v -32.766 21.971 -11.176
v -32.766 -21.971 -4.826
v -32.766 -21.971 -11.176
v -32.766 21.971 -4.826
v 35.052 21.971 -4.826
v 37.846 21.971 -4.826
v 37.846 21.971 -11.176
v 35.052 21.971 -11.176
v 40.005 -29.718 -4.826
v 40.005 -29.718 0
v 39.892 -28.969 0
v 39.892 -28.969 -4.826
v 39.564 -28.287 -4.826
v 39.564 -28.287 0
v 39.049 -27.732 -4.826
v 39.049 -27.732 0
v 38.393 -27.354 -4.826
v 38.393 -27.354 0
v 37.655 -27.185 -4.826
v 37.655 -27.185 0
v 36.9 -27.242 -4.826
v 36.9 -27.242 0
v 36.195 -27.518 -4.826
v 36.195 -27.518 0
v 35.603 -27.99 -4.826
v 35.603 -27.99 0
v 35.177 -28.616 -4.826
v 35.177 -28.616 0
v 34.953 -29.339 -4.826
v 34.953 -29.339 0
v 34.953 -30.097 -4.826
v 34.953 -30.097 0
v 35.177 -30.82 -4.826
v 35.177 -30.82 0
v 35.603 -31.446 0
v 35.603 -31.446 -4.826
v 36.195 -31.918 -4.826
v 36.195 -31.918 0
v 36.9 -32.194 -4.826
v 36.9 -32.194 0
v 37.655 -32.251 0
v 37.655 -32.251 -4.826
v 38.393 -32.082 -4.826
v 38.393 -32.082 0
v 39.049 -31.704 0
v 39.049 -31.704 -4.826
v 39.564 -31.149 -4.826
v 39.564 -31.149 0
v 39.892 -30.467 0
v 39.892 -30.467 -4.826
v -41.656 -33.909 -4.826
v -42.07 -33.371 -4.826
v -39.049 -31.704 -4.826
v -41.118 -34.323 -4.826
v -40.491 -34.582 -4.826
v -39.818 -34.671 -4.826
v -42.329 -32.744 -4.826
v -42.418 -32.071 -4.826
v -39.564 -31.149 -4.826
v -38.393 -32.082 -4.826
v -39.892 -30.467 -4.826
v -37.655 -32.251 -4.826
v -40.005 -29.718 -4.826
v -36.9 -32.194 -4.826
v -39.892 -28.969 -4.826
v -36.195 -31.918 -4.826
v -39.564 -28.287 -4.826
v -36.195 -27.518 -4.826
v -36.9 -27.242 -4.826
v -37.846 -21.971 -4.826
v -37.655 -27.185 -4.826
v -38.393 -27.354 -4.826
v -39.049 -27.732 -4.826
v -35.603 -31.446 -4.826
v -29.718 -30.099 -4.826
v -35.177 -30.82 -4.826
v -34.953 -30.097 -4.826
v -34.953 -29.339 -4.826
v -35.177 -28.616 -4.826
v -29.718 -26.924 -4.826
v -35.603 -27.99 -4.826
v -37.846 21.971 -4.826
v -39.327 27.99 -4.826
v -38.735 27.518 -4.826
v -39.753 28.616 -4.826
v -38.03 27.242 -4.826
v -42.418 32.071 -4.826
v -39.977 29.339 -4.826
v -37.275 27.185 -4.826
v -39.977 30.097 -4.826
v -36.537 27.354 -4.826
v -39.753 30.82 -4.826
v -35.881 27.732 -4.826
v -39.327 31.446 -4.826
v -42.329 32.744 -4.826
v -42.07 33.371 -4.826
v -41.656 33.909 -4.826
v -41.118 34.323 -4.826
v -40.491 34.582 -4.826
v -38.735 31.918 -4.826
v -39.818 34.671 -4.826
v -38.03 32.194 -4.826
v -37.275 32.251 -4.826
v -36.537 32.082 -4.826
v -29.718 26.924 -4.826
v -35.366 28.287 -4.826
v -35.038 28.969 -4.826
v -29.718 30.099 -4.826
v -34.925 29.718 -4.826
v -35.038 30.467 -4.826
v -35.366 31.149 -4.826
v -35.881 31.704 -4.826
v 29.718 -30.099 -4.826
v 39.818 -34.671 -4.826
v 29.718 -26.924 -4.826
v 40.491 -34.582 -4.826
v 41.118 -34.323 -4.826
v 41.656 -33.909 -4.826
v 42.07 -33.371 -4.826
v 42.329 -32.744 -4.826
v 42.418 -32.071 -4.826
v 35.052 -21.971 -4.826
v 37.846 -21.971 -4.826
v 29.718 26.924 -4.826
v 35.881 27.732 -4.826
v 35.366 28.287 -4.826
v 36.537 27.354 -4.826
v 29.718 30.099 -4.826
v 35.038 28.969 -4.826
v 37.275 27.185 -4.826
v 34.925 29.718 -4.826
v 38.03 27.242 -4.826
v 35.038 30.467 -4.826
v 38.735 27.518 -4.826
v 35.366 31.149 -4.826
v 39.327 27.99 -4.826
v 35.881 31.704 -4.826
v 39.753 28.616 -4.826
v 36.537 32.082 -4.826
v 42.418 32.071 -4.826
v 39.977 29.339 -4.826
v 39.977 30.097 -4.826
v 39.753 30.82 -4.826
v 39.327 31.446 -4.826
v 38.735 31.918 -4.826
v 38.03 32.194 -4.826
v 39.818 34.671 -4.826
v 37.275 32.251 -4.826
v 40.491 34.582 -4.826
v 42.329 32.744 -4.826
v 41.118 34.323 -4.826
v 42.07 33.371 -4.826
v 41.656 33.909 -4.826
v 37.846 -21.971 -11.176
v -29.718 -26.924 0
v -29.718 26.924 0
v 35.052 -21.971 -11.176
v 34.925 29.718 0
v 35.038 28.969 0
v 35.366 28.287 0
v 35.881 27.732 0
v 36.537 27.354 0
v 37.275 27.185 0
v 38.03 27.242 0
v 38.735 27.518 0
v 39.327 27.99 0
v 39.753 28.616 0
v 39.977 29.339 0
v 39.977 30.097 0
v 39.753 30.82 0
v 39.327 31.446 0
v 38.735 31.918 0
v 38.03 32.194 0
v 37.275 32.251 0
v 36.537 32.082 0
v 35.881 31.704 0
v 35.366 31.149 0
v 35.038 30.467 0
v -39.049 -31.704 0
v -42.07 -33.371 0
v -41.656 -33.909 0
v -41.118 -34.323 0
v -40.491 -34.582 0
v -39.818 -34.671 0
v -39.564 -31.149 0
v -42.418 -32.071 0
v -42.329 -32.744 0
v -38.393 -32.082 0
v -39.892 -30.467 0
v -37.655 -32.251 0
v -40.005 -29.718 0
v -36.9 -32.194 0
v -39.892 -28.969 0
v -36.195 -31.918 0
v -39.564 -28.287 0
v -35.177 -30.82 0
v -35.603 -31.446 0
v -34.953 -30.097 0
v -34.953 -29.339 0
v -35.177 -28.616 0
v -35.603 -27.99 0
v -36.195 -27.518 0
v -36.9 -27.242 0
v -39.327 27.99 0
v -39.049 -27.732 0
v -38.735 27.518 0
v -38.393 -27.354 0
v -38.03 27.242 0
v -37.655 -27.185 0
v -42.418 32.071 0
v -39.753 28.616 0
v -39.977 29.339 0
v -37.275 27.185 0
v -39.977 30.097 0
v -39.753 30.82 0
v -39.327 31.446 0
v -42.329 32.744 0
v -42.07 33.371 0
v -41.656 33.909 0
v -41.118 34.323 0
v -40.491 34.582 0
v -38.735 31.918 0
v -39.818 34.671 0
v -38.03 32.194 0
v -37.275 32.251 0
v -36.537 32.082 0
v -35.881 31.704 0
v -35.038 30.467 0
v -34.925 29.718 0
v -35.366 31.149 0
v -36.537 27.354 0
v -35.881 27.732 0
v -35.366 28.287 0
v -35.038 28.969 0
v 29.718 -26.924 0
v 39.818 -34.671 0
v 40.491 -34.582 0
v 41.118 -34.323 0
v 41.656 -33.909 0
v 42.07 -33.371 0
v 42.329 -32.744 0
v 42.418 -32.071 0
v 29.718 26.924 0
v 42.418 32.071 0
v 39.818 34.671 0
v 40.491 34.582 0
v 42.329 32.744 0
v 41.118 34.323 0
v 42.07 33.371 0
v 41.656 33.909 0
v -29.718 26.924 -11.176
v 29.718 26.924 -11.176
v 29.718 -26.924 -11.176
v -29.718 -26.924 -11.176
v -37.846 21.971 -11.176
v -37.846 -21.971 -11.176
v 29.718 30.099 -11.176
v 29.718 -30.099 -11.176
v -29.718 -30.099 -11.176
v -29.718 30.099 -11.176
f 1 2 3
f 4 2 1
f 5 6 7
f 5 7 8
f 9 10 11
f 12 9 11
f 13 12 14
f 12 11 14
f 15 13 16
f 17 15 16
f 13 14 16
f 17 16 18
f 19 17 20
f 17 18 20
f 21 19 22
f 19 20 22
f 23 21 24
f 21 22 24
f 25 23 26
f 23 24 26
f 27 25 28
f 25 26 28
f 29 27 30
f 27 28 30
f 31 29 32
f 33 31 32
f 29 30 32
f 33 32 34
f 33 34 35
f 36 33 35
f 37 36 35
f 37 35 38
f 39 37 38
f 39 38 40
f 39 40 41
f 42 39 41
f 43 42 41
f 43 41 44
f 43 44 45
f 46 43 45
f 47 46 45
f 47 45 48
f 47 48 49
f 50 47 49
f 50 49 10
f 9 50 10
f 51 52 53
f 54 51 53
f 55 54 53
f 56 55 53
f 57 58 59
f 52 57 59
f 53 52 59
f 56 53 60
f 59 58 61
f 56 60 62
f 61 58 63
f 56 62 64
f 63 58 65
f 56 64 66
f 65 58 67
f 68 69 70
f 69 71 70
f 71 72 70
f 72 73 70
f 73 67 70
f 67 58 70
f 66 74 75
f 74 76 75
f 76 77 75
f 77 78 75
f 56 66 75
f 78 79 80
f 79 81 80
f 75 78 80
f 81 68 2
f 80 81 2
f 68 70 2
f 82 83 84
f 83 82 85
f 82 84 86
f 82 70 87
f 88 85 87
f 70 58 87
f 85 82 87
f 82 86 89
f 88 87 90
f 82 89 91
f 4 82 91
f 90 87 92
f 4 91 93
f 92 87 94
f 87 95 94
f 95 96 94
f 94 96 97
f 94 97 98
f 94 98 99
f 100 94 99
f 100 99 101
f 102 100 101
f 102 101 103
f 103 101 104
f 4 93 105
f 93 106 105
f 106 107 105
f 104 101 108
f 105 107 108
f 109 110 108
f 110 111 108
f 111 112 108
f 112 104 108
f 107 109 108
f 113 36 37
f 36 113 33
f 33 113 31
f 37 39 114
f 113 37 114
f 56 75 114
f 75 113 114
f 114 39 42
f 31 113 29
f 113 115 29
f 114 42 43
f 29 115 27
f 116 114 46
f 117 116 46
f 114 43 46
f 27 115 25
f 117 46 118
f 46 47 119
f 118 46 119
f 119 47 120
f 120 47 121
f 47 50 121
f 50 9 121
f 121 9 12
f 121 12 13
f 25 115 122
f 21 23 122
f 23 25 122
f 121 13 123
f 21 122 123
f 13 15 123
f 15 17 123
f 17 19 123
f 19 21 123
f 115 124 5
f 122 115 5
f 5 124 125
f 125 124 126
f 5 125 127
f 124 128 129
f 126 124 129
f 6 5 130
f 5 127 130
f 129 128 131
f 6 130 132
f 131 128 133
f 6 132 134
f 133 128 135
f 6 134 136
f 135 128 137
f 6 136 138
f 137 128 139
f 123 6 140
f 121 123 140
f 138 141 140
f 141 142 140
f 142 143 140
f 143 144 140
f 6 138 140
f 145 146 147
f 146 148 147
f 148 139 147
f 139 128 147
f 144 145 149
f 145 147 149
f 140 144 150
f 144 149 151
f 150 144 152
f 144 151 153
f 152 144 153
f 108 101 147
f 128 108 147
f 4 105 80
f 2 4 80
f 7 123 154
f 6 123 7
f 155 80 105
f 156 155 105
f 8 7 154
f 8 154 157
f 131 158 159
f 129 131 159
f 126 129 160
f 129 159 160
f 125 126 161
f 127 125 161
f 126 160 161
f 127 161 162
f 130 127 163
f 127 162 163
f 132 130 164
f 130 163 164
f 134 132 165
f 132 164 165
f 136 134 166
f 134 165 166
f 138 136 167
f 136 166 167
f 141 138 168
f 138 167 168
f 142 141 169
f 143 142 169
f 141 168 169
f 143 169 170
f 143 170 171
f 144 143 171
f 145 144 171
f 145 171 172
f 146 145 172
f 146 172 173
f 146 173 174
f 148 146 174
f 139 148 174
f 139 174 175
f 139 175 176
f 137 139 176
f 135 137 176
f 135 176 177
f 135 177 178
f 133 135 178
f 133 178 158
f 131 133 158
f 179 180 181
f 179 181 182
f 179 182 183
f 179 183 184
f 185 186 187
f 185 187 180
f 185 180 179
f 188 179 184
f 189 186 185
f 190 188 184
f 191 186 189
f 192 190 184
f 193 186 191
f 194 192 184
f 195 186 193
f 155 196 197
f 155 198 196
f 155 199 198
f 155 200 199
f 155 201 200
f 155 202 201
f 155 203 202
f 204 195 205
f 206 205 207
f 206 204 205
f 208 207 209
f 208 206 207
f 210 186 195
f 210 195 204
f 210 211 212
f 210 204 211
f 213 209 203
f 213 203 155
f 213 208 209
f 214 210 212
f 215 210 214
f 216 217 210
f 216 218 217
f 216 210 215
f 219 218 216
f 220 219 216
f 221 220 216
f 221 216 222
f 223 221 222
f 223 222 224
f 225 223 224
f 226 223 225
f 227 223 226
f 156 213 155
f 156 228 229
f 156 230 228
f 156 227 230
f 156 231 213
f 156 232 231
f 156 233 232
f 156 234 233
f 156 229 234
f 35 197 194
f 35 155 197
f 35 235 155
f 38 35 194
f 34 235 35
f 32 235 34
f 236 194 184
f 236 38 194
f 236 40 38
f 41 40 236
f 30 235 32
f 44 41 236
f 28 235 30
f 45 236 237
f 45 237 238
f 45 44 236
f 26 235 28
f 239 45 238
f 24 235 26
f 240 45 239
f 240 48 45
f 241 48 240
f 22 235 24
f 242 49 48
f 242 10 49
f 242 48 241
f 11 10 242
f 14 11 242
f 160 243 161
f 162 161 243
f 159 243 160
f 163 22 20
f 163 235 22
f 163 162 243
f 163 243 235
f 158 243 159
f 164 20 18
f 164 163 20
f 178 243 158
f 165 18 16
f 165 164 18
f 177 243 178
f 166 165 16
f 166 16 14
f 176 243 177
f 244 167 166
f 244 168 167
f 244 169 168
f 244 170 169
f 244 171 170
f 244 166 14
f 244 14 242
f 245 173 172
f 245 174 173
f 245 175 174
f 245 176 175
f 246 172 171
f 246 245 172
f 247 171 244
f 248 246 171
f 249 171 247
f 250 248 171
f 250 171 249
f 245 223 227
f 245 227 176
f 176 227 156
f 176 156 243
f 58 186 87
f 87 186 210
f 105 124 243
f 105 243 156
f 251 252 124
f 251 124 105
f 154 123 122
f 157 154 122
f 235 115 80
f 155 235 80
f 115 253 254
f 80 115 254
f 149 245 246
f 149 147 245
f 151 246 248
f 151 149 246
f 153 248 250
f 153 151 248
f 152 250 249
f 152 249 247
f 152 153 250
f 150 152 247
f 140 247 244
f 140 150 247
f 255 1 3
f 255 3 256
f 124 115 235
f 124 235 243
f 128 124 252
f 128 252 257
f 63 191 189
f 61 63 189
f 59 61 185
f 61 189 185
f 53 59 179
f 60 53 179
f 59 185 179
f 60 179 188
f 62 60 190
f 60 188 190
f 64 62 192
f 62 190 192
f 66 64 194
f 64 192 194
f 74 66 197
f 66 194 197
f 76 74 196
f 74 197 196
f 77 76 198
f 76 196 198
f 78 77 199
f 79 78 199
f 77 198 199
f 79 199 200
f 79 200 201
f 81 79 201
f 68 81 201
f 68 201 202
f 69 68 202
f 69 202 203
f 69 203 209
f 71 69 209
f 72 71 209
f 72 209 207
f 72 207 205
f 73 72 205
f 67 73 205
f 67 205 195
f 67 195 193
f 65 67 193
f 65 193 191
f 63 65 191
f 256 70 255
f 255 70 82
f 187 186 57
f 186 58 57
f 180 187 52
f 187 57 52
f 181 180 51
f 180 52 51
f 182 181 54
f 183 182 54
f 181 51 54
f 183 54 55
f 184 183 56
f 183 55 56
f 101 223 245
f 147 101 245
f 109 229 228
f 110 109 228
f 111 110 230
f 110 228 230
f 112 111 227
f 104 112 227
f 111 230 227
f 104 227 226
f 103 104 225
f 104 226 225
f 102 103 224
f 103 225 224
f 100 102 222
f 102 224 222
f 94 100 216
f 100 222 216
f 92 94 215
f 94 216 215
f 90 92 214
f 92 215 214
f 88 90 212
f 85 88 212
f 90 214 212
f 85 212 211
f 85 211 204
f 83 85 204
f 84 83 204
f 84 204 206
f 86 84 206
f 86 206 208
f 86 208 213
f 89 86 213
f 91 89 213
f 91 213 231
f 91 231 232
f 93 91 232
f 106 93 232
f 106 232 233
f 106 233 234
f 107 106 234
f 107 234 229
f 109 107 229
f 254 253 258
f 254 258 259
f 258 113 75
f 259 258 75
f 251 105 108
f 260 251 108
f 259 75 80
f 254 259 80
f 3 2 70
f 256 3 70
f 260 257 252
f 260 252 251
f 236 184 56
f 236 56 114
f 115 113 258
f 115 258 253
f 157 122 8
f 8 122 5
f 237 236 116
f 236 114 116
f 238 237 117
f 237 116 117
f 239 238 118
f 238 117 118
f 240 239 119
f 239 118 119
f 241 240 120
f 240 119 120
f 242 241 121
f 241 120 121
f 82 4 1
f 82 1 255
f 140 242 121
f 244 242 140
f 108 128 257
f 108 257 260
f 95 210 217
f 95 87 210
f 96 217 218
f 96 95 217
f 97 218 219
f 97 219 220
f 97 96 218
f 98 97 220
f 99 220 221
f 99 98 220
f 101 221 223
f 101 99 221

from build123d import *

# Parameters (mm, degrees)
SKETCH1_W           = 84.836
SKETCH1_H           = 69.342
BASE_FLANGE1_DEPTH  = 4.826
SKETCH6_R           = 2.54
CUT_EXTRUDE1_DEPTH  = 10
FILLET1_R           = 2.6
SKETCH11_W          = 59.436
SKETCH11_H          = 3.175
SKETCH11_W_2        = 5.08
SKETCH11_H_2        = 43.942
SKETCH11_W_3        = 2.794
BOSS_EXTRUDE1_DEPTH = 6.35
SKETCH12_W          = 59.436
SKETCH12_H          = 53.848
CUT_EXTRUDE5_DEPTH  = 56.151495583


# Sheet-metal steps are written as plain solids
with BuildPart() as part:
    # Sketch1 → Base-Flange1 (new body)
    with BuildSketch(Plane.XY):
        Rectangle(SKETCH1_W, SKETCH1_H)
    extrude(amount=-BASE_FLANGE1_DEPTH)

    # Sketch6 → Cut-Extrude1 (cut)
    with BuildSketch(Plane.XY):
        with Locations((-37.465, 29.718)):
            Circle(SKETCH6_R)
        with Locations(Location((-37.465, -29.718, 0), (0, 0, 180))):
            Circle(SKETCH6_R)
        with Locations((37.465, -29.718)):
            Circle(SKETCH6_R)
        with Locations(Location((37.465, 29.718, 0), (0, 0, 180))):
            Circle(SKETCH6_R)
    extrude(amount=-CUT_EXTRUDE1_DEPTH, mode=Mode.SUBTRACT)

    # Fillet1
    fillet1_edges = [part.edges().sort_by_distance(p)[0] for p in [
        (-42.418, 34.671, -2.413),
        (42.418, 34.671, -2.413),
        (42.418, -34.671, -2.413),
        (-42.418, -34.671, -2.413),
    ]]
    fillet(fillet1_edges, radius=FILLET1_R)

    # Sketch11 → Boss-Extrude1 (add)
    with BuildSketch(Plane(origin=(0, 0, -4.826), x_dir=(-1, 0, 0), z_dir=(0, 0, -1))):
        with Locations((0, 28.5115)):
            Rectangle(SKETCH11_W, SKETCH11_H)
        with Locations((35.306, 0)):
            Rectangle(SKETCH11_W_2, SKETCH11_H_2)
        with Locations((0, -28.5115)):
            Rectangle(SKETCH11_W, SKETCH11_H)
        with Locations((-36.449, 0)):
            Rectangle(SKETCH11_W_3, SKETCH11_H_2)
    extrude(amount=BOSS_EXTRUDE1_DEPTH)

    # Sketch12 → Cut-Extrude5 (cut, through all)
    with BuildSketch(Plane(origin=(0, 0, -4.826), x_dir=(-1, 0, 0), z_dir=(0, 0, -1))):
        Rectangle(SKETCH12_W, SKETCH12_H)
    extrude(amount=-CUT_EXTRUDE5_DEPTH, mode=Mode.SUBTRACT)


solid = part.part
